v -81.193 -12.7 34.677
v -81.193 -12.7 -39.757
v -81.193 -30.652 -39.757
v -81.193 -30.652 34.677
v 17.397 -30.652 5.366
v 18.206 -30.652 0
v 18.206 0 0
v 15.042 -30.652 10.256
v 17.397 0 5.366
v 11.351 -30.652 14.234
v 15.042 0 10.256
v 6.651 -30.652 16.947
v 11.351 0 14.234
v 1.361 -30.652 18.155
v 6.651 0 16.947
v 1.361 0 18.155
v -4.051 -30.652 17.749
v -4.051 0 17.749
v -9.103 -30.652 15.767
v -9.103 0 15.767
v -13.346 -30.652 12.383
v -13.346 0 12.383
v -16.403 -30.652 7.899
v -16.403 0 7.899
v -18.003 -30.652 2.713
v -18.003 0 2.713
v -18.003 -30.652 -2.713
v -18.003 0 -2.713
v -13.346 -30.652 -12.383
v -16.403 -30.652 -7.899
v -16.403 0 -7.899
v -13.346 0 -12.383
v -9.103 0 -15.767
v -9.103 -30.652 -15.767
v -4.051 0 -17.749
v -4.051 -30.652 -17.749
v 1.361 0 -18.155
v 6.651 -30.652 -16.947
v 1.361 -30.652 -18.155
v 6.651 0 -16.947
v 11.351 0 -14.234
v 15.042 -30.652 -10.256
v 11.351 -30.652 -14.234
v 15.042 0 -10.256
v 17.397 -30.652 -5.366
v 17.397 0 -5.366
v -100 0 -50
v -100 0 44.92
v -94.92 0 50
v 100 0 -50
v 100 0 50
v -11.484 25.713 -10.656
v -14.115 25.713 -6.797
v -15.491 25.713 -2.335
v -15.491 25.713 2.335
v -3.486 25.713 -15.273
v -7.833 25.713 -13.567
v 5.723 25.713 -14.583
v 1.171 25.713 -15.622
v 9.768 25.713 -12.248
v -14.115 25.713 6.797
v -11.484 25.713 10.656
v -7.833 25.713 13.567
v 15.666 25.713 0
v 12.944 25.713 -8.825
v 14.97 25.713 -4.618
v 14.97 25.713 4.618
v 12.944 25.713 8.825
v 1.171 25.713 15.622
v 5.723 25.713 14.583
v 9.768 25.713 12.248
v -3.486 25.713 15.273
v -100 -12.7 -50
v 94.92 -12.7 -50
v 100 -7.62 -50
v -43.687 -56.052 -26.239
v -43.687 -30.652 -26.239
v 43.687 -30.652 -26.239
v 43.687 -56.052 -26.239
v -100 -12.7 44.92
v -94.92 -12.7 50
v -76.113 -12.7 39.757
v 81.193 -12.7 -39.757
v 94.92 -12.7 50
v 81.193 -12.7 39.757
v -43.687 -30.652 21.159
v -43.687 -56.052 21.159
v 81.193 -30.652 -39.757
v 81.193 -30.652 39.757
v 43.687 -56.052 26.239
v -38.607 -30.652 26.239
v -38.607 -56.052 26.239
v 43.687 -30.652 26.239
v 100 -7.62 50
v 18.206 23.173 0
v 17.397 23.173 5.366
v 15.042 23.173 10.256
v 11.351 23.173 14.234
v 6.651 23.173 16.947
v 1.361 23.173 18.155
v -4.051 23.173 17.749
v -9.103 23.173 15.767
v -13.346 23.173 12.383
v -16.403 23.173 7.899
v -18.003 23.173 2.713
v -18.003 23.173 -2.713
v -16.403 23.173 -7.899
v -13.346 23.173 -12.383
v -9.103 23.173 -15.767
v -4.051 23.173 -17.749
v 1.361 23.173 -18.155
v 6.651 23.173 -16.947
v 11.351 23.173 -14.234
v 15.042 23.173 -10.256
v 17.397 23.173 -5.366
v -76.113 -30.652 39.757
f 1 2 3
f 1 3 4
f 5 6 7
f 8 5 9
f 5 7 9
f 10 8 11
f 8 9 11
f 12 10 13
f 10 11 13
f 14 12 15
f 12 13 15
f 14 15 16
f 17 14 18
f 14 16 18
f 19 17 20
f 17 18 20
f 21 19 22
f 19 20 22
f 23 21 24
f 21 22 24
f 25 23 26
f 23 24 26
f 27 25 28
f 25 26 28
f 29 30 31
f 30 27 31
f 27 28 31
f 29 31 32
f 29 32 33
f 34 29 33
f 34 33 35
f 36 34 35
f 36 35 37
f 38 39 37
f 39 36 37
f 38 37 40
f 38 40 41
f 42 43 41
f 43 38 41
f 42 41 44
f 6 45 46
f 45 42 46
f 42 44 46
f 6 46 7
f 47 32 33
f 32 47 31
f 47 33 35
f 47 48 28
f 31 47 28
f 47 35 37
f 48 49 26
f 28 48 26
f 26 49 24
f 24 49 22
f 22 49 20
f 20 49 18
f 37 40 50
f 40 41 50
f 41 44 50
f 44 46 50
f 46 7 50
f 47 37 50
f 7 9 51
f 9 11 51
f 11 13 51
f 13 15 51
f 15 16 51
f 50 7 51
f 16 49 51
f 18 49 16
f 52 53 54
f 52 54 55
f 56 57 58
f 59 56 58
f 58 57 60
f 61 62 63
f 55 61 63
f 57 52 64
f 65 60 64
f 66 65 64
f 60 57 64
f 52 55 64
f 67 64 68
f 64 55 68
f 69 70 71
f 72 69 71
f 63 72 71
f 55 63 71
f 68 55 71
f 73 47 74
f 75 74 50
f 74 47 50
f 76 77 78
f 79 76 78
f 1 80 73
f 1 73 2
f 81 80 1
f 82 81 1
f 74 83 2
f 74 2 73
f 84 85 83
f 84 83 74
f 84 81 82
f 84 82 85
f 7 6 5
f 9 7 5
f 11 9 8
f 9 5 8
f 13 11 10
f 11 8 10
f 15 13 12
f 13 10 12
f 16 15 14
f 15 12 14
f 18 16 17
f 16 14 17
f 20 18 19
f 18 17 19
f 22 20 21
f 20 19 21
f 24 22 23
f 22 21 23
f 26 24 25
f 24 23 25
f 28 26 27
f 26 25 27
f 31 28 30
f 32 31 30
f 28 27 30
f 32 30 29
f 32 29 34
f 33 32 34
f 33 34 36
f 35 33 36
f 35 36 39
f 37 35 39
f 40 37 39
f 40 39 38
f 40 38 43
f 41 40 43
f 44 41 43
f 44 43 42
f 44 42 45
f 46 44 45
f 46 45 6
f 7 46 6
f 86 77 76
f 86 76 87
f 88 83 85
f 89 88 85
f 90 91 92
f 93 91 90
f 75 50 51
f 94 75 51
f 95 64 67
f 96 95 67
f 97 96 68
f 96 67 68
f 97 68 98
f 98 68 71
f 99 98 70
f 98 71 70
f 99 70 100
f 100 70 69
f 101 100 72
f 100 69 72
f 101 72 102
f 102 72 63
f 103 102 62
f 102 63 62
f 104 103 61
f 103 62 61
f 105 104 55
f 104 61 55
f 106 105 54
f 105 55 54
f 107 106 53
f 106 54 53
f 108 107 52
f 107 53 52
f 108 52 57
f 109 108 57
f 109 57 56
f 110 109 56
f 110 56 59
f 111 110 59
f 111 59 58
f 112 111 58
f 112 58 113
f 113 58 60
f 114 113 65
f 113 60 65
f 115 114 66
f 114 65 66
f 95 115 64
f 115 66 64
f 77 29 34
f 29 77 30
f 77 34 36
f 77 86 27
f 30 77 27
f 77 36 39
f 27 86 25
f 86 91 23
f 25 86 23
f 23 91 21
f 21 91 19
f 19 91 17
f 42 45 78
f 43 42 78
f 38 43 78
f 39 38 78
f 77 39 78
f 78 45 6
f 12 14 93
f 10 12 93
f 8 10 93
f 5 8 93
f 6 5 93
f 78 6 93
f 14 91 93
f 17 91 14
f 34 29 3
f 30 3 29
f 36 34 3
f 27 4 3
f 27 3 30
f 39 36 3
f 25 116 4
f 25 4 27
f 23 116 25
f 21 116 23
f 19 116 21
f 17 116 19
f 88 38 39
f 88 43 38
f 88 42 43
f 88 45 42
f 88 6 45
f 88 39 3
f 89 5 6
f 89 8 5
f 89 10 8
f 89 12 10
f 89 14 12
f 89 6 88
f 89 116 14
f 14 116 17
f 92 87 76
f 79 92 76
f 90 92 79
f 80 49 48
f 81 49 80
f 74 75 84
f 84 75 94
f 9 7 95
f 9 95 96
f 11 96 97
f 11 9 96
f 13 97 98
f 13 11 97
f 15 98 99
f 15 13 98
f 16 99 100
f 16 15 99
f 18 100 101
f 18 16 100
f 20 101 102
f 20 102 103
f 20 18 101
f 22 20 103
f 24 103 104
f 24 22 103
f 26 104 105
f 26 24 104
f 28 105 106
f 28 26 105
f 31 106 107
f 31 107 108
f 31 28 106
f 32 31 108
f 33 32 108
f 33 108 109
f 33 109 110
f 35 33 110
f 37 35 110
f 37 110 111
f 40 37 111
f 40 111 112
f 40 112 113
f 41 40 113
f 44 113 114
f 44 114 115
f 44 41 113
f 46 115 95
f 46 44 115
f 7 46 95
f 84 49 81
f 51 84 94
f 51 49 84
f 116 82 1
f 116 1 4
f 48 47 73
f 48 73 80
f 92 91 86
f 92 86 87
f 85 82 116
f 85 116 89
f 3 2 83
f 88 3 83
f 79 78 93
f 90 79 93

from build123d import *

# Parameters (mm, degrees)
F0_W       = 200
F0_H       = 100
F0_W_2     = 162.3857170343
F0_H_2     = 79.5144736767
F1_DEPTH   = 12.7
F2_DEPTH   = 30.65165
F3_R       = 18.2059366906
F4_DEPTH   = 77.93234
F5_W       = 87.3743593693
F5_H       = 52.4778924882
F6_DEPTH   = 25.4
F7_R       = 18.2059366906
F8_DEPTH   = 25.71261
F9_R       = 18.2059366906
F10_DEPTH  = 33.7499
F11_SIZE   = 5.08
F11_2_SIZE = 5.08
F12_SIZE   = 2.54


with BuildPart() as f1:
    # F0 (on Front) → F1 (new body)
    with BuildSketch(Plane.XZ):
        Rectangle(F0_W, F0_H)
        Rectangle(F0_W_2, F0_H_2, mode=Mode.SUBTRACT)
    extrude(amount=F1_DEPTH)

    # F0 (on Front) → F2 (join)
    with BuildSketch(Plane.XZ):
        Rectangle(F0_W_2, F0_H_2)
    extrude(amount=F2_DEPTH)

    # F3 (on face) → F4 (cut)
    with BuildSketch(Plane.XZ.offset(30.65165)):
        Circle(F3_R)
    extrude(amount=-F4_DEPTH, mode=Mode.SUBTRACT)

    # F11#2
    f11_2_edges = [f1.edges().sort_by_distance(p)[0] for p in [
        (100, -12.7, 0),
        (-81.192859, -21.675825, 39.757237),
        (-100, -6.35, 50),
    ]]
    chamfer(f11_2_edges, length=F11_2_SIZE)


with BuildPart() as f6:
    # F5 (on face) → F6 (new body)
    with BuildSketch(Plane.XZ.offset(30.65165)):
        Rectangle(F5_W, F5_H)
    extrude(amount=F6_DEPTH)



with BuildPart() as f8:
    # F7 (on face) → F8 (new body)
    with BuildSketch(Plane.XZ):
        Circle(F7_R)
    extrude(amount=-F8_DEPTH)


with BuildPart() as f6_1:
    add(f6.part)

    add(f8.part)  # F10 merges F8
    # F9 (on face) → F10 (join)
    with BuildSketch(Plane.XZ):
        Circle(F9_R)
    extrude(amount=F10_DEPTH)

    # F11
    f11_edges = [f6_1.edges().sort_by_distance(p)[0] for p in [
        (-43.68718, -43.35165, 26.238946),
    ]]
    chamfer(f11_edges, length=F11_SIZE)

    # F12
    f12_edges = [f6_1.edges().sort_by_distance(p)[0] for p in [
        (-18.205937, 25.71261, 0),
    ]]
    chamfer(f12_edges, length=F12_SIZE)


solid = Compound([f1.part, f6_1.part])
